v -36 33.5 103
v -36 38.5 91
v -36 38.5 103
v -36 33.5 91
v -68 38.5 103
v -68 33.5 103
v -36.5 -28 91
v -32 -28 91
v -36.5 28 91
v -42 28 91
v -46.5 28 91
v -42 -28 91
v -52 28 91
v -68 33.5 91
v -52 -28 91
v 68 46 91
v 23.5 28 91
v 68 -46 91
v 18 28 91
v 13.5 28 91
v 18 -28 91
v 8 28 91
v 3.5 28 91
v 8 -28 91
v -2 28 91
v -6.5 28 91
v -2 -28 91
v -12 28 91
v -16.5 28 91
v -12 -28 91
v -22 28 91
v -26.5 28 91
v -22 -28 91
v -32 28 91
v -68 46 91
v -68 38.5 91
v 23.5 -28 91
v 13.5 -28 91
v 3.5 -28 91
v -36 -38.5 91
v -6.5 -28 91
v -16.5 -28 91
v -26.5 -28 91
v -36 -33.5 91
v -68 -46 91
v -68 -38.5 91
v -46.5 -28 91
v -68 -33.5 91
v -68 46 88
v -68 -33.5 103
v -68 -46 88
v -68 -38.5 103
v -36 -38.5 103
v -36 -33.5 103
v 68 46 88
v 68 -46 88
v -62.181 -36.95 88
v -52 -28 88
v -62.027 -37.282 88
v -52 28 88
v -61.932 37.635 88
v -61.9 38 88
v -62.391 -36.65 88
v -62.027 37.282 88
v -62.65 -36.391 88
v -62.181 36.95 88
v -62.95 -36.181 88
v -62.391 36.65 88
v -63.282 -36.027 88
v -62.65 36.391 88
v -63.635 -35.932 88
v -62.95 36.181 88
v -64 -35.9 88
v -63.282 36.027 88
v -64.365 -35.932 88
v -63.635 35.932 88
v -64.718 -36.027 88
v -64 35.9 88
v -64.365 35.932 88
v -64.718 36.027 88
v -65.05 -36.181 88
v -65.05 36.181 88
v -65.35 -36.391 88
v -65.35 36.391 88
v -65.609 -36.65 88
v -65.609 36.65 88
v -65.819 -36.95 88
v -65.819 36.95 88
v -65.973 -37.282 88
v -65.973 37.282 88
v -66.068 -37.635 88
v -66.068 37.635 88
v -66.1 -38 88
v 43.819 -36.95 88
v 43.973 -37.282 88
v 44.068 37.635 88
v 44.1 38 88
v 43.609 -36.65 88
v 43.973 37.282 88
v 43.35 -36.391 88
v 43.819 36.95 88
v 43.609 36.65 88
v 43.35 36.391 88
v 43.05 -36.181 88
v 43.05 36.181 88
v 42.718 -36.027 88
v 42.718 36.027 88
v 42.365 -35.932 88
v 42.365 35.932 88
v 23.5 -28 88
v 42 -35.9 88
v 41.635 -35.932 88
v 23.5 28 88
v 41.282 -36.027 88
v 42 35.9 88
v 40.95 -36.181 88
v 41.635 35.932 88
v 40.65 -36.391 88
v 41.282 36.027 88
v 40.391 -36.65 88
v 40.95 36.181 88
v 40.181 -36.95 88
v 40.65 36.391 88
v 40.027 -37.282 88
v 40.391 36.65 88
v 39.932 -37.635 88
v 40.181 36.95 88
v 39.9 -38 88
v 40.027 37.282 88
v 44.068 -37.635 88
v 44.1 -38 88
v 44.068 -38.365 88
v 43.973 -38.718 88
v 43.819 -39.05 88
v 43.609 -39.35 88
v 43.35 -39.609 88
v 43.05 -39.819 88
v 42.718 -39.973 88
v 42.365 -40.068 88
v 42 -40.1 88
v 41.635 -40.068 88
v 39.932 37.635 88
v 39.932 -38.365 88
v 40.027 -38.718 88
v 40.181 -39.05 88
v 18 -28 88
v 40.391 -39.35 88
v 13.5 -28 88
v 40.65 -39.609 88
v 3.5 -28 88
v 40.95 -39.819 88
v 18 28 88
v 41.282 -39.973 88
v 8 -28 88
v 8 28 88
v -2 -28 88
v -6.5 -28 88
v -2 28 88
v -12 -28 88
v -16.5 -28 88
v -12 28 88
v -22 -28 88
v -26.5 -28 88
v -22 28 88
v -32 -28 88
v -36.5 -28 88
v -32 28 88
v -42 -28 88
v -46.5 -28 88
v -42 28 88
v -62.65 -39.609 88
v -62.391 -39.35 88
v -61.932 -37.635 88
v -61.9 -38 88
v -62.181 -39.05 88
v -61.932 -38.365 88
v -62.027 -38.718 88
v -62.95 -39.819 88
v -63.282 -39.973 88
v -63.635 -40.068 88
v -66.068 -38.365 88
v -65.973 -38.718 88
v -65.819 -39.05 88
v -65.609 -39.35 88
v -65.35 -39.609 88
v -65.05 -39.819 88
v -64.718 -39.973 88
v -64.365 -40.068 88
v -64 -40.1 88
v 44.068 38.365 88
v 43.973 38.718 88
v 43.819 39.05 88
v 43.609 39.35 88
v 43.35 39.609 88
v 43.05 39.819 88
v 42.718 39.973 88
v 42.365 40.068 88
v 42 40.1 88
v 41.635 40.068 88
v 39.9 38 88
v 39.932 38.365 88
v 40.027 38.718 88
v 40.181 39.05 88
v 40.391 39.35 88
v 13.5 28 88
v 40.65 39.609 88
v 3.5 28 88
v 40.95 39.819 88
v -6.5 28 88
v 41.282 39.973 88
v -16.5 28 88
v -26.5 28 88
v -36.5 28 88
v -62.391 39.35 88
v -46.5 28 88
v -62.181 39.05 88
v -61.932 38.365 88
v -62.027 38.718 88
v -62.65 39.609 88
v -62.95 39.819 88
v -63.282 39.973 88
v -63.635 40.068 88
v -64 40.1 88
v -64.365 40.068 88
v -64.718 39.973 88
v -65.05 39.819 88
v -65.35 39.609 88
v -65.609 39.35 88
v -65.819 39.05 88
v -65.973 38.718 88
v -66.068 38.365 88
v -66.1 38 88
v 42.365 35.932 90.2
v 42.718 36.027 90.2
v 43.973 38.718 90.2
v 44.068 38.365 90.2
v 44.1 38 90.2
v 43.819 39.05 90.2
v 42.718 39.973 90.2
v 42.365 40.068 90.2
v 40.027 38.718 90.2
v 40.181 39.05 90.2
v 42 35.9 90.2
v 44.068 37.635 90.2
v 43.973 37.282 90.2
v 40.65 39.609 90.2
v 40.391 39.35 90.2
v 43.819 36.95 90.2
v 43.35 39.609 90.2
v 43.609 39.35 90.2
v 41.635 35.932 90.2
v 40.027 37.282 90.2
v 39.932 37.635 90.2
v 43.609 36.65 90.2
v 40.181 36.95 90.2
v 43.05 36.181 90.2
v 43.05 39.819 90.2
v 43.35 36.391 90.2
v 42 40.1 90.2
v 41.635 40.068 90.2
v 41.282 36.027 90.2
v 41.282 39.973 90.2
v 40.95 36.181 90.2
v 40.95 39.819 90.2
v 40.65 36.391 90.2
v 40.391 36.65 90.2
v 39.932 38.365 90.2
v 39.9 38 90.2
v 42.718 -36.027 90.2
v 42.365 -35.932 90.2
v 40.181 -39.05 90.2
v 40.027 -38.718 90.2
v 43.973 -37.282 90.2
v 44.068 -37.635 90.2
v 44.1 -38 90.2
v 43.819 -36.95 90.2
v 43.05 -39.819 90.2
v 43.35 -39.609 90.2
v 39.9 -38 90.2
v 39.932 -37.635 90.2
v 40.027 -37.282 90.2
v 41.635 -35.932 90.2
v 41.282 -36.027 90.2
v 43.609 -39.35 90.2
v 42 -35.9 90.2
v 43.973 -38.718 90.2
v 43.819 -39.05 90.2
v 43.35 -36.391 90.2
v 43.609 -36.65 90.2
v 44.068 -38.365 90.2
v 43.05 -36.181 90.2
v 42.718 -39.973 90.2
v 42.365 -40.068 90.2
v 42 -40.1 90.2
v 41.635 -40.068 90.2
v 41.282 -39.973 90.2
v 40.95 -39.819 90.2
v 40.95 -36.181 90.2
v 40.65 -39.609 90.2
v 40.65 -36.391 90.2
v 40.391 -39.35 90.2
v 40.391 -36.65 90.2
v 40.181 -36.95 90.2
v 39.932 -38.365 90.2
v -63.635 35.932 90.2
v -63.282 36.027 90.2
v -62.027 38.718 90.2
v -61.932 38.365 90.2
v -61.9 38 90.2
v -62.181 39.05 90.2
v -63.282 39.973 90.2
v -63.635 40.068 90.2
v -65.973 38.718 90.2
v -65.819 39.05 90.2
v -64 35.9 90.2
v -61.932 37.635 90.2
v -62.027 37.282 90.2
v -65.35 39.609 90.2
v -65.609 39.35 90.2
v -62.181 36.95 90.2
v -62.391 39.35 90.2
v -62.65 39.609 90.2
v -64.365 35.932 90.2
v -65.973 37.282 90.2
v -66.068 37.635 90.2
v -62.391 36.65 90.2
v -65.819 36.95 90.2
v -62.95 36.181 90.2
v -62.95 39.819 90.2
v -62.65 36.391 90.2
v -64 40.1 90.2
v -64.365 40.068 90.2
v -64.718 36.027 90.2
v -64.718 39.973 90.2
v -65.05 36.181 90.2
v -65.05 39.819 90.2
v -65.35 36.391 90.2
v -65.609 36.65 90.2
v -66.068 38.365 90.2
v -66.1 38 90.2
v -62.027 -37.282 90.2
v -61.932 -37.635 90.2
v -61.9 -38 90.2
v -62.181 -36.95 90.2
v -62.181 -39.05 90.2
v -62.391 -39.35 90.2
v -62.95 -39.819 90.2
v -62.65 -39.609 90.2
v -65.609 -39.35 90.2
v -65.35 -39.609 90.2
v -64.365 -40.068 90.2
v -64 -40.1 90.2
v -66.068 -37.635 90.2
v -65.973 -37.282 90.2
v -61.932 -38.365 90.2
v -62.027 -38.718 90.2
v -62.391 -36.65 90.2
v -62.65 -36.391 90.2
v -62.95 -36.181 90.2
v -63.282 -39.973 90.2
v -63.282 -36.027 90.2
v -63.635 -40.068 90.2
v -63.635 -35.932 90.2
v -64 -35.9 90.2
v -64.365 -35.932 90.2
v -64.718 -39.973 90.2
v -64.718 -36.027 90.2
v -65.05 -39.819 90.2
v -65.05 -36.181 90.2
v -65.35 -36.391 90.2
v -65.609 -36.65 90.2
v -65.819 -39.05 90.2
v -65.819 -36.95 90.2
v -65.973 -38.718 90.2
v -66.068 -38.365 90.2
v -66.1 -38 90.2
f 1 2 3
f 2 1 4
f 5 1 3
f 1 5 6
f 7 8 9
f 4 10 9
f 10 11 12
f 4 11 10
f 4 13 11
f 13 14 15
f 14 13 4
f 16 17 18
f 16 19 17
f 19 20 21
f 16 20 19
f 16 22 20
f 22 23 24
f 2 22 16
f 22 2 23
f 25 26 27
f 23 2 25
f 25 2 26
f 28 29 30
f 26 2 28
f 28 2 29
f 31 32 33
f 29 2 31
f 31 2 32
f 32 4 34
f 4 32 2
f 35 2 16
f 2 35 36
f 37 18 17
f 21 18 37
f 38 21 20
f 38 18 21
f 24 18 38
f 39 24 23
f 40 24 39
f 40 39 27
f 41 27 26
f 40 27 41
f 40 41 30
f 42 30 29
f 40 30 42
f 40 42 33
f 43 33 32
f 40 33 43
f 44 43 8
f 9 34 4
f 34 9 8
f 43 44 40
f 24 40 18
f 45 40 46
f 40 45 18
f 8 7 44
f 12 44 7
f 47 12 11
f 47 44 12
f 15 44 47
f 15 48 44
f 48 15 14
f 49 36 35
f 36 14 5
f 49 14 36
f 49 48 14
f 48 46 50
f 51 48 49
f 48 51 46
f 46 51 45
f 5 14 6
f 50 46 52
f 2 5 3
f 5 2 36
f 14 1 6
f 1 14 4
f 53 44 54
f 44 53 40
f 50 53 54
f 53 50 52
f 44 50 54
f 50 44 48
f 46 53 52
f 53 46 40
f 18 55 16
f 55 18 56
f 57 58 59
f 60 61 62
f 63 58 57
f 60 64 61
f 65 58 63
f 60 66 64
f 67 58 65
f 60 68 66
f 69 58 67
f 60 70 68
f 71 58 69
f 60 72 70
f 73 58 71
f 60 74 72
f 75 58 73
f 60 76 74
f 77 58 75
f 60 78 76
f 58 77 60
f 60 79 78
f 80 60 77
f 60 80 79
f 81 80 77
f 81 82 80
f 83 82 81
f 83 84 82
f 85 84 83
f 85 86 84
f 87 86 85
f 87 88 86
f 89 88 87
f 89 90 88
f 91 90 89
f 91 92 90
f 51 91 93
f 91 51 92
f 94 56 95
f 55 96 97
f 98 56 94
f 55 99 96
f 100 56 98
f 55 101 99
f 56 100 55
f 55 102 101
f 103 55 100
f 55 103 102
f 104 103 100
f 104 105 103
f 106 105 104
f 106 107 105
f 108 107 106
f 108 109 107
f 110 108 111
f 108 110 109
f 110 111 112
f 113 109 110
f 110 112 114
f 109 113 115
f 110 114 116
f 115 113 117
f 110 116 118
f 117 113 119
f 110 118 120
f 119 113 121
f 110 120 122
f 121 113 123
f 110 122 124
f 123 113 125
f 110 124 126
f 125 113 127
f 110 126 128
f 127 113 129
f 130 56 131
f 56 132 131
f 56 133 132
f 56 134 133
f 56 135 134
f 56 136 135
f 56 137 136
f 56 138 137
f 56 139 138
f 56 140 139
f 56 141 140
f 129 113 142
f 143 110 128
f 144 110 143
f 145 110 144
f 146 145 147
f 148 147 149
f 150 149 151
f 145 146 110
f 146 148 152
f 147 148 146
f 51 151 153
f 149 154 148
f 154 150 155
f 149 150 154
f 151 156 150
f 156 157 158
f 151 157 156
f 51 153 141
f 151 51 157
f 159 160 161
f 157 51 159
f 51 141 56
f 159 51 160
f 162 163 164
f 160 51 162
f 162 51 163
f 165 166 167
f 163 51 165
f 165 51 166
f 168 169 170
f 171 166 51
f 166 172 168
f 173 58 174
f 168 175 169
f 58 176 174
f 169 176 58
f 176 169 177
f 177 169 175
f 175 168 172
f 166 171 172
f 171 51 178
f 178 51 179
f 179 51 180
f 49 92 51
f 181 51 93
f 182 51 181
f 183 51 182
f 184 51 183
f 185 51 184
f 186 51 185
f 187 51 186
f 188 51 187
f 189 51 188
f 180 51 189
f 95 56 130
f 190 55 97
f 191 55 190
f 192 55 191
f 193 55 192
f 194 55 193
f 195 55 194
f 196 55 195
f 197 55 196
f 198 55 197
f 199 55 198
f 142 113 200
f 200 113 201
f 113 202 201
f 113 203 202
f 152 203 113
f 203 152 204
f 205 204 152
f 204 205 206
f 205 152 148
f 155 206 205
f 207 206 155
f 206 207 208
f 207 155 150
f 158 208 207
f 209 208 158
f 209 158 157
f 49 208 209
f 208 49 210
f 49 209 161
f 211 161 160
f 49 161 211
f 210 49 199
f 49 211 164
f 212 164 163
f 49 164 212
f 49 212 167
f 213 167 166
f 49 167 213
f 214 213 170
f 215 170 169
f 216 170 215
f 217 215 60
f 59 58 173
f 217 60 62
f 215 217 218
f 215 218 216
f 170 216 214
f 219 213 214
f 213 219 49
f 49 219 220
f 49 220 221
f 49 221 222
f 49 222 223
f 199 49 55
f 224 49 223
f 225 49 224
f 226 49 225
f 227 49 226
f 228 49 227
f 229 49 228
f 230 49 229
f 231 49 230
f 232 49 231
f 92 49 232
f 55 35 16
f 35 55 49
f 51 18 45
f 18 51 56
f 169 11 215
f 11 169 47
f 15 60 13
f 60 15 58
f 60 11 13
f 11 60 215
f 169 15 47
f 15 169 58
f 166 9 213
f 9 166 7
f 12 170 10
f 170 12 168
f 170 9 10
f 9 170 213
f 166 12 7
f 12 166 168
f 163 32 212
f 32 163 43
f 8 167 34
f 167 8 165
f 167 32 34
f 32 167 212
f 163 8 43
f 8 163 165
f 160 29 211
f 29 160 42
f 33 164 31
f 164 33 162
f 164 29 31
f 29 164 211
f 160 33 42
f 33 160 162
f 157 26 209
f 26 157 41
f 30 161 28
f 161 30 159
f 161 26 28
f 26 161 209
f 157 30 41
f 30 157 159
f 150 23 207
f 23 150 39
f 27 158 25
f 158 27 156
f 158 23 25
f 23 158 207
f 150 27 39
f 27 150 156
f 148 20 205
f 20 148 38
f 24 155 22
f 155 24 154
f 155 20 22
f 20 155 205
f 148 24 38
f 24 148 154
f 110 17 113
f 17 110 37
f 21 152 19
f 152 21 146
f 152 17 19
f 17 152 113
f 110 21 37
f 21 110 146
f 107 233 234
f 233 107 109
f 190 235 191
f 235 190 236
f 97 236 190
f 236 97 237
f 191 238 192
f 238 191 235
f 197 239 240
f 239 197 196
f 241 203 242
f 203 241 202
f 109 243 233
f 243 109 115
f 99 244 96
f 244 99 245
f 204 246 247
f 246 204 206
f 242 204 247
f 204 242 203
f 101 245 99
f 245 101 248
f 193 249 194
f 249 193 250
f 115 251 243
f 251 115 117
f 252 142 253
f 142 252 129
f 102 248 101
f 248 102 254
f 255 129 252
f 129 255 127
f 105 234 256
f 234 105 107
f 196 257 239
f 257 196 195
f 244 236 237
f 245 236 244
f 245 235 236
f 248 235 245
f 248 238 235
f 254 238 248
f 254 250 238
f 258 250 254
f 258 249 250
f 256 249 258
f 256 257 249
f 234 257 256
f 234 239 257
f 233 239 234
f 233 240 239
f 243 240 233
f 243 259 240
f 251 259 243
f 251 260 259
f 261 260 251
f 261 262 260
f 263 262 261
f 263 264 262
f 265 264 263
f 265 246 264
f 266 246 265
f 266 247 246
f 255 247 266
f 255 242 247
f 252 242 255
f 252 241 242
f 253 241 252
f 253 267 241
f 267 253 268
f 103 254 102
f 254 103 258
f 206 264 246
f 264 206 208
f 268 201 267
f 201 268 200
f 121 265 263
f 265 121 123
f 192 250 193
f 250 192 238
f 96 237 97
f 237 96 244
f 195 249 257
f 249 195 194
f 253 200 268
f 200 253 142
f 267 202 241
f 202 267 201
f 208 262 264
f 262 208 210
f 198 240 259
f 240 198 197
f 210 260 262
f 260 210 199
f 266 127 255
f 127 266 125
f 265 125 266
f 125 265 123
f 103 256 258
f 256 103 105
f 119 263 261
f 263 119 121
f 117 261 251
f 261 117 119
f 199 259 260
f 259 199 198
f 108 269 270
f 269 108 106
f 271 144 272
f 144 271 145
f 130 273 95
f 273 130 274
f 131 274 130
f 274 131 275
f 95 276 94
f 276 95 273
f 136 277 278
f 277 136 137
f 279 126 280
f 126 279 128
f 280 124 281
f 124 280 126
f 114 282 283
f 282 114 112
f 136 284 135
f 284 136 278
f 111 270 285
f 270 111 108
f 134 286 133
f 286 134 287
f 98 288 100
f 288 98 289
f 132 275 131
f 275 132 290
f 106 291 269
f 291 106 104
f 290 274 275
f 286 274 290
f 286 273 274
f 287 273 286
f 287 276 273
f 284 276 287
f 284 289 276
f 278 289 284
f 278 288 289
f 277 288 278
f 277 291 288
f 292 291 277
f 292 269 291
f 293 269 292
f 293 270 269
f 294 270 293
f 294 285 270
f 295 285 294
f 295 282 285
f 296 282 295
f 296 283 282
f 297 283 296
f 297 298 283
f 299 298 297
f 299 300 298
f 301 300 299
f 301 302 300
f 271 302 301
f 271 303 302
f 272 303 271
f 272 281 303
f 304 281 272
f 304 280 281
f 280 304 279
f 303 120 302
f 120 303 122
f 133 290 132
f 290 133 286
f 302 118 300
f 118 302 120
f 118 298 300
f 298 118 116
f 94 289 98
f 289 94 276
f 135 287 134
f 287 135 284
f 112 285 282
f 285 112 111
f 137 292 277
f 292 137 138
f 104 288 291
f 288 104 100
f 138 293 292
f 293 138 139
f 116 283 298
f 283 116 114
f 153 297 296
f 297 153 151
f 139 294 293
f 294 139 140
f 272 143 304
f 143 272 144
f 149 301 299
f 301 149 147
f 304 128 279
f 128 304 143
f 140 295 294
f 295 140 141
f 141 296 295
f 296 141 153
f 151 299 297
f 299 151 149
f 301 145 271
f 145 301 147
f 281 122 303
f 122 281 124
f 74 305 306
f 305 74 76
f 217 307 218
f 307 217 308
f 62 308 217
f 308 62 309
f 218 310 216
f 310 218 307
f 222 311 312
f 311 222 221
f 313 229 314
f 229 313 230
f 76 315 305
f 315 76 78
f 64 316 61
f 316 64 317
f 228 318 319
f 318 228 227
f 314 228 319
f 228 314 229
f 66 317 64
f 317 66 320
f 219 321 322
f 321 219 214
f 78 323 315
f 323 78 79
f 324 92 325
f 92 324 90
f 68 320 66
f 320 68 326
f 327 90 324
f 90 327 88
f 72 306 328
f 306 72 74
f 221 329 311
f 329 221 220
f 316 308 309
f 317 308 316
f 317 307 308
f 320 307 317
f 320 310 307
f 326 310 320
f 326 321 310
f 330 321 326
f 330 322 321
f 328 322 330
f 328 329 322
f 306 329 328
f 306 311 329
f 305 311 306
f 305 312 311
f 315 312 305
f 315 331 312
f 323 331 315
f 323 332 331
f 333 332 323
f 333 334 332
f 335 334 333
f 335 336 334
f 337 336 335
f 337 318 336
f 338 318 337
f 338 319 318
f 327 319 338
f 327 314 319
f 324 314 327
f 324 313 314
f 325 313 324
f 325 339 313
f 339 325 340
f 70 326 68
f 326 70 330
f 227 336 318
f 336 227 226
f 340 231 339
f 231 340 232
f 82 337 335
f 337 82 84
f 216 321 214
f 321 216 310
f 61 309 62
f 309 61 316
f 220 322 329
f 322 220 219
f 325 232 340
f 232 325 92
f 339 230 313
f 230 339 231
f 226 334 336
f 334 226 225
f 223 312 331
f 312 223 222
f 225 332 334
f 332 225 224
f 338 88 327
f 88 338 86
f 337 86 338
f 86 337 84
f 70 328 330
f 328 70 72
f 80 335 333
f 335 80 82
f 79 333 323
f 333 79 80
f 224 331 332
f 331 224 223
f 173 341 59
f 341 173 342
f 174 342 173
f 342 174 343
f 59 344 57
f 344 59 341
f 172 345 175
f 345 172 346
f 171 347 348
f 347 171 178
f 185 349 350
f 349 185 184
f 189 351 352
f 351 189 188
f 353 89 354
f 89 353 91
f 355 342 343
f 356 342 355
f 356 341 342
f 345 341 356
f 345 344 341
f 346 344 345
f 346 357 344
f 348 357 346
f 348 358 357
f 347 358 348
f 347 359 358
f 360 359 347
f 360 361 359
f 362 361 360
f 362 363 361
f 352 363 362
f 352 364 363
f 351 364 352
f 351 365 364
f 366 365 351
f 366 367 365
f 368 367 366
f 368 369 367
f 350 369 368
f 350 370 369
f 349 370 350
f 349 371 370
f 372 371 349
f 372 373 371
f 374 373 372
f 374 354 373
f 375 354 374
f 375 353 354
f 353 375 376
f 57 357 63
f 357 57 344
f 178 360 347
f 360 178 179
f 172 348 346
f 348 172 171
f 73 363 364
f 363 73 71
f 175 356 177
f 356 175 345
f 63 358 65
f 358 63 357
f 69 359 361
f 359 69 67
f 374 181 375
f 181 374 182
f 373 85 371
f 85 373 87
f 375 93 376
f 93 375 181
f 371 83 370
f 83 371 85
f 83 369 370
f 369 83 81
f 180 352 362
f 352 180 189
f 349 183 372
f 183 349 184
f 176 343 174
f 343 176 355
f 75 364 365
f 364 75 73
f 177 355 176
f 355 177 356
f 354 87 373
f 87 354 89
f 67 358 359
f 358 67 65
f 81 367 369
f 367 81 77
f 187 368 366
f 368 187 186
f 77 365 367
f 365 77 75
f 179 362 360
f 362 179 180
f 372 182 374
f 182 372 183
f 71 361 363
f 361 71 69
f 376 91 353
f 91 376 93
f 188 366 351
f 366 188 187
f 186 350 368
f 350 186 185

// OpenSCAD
// file: cyber_parameters.scad
// ============================================================================
// cute-esp32-lego-car / cad / cyber-print / cyber_parameters.scad
// 拓竹 A1 3D打印机赛博黑透战术探索版参数化核心尺寸库 (单位: mm)
// ============================================================================

$fn = 36;

// 1. 机电驱动与车轮参数 (基于订单 Row 18/23/38 实物核算)
wheel_diameter       = 34.0;  // ZJ327 橡胶轮外径 34.0mm
wheel_tire_width     = 7.0;   // 胎面宽 7.0mm
wheel_hub_width      = 9.5;   // 轮毂总厚 9.5mm (含内侧码盘凸台)
wheel_axle_dia       = 3.0;   // 3mm D型轴
wheel_axle_z         = 17.0;  // 轮轴中心距地高 17.0mm (= 34/2 完美同心)
ground_clearance     = 9.0;   // 底盘最低离地间隙 9.0mm

// 1812-N20 蜗轮蜗杆减速电机 (6V 190RPM 速比42 纵向安装)
n20_gearbox_l        = 18.0;  // 1812 蜗轮箱长
n20_motor_l          = 15.0;  // 电机筒长
n20_total_l          = 33.0;  // 电机总长
n20_width            = 12.0;  // 机身宽
n20_height           = 10.0;  // 机身高
n20_shaft_offset_x   = 6.0;   // 轴距齿轮箱前缘距离

// 2. 关键几何布局 (针对蜗轮自锁差速转向优化)
wheelbase            = 90.0;  // 前后轴距 90.0mm (前轴 +45mm, 后轴 -45mm)
track_width          = 107.5; // 左右轮胎中心距 107.5mm
ratio_wb_tw          = wheelbase / track_width; // 0.837 差速转向黄金比

// 3. 2S 18650 电池仓与电子托盘
bat_bay_l            = 76.0;  // 电池仓净内长
bat_bay_w            = 41.0;  // 电池仓净内宽
bat_bay_h            = 16.0;  // 电池仓槽深

// 4. 电子板安装孔距
esp32_hole_x         = 60.0;  // 38Pin 扩展板长向孔距
esp32_hole_y         = 47.0;  // 38Pin 扩展板宽向孔距
l298n_hole_pitch     = 37.0;  // L298N 驱动板 37x37mm 标准孔距
lm2596_hole_dist     = 31.0;  // LM2596S 对角孔距

// 5. 3D 打印配合与公差设计 (拓竹 A1 级精度)
m3_heatset_hole_dia  = 4.0;   // M3 热熔铜螺母预留底孔 Ø4.0mm
m3_pass_hole_dia     = 3.4;   // M3 穿钉过孔 Ø3.4mm
magnet_dia           = 4.2;   // Ø4x2mm 磁铁嵌入槽孔径
magnet_depth         = 2.2;   // 磁铁沉槽深度
min_wall_thickness   = 2.0;   // 结构外壁最小厚度
chamfer_angle        = 45.0;  // 45° 无支撑自支撑斜角
// main file
// ============================================================================
// Part 4: 极客百叶风道快拆顶盖 (Quick-Release Roof Canopy)
// ============================================================================
include <cyber_parameters.scad>

module quick_release_roof_canopy() {
    difference() {
        union() {
            // 顶盖基板 (136 x 92 x 3.0 mm)
            translate([-68, -46, 88.0])
                cube([136, 92, 3.0]);

            // 尾部双扰流小尾翼
            for (fy = [36.0, -36.0]) {
                translate([-68, fy - 2.5, 91.0])
                    cube([32, 5.0, 12.0]);
            }
        }

        // L298N 散热片直通排热百叶缝 (8 道斜风口)
        for (lx = [-5 : 2]) {
            translate([lx * 10 - 2, -28, 87.0])
                cube([5.5, 56.0, 5.0]);
        }

        // 4 角磁铁沉槽 (与车壳对吸)
        for (rx = [42, -64], ry = [38, -38]) {
            translate([rx, ry, 88.0])
                cylinder(d = magnet_dia, h = magnet_depth);
        }
    }
}

quick_release_roof_canopy();
